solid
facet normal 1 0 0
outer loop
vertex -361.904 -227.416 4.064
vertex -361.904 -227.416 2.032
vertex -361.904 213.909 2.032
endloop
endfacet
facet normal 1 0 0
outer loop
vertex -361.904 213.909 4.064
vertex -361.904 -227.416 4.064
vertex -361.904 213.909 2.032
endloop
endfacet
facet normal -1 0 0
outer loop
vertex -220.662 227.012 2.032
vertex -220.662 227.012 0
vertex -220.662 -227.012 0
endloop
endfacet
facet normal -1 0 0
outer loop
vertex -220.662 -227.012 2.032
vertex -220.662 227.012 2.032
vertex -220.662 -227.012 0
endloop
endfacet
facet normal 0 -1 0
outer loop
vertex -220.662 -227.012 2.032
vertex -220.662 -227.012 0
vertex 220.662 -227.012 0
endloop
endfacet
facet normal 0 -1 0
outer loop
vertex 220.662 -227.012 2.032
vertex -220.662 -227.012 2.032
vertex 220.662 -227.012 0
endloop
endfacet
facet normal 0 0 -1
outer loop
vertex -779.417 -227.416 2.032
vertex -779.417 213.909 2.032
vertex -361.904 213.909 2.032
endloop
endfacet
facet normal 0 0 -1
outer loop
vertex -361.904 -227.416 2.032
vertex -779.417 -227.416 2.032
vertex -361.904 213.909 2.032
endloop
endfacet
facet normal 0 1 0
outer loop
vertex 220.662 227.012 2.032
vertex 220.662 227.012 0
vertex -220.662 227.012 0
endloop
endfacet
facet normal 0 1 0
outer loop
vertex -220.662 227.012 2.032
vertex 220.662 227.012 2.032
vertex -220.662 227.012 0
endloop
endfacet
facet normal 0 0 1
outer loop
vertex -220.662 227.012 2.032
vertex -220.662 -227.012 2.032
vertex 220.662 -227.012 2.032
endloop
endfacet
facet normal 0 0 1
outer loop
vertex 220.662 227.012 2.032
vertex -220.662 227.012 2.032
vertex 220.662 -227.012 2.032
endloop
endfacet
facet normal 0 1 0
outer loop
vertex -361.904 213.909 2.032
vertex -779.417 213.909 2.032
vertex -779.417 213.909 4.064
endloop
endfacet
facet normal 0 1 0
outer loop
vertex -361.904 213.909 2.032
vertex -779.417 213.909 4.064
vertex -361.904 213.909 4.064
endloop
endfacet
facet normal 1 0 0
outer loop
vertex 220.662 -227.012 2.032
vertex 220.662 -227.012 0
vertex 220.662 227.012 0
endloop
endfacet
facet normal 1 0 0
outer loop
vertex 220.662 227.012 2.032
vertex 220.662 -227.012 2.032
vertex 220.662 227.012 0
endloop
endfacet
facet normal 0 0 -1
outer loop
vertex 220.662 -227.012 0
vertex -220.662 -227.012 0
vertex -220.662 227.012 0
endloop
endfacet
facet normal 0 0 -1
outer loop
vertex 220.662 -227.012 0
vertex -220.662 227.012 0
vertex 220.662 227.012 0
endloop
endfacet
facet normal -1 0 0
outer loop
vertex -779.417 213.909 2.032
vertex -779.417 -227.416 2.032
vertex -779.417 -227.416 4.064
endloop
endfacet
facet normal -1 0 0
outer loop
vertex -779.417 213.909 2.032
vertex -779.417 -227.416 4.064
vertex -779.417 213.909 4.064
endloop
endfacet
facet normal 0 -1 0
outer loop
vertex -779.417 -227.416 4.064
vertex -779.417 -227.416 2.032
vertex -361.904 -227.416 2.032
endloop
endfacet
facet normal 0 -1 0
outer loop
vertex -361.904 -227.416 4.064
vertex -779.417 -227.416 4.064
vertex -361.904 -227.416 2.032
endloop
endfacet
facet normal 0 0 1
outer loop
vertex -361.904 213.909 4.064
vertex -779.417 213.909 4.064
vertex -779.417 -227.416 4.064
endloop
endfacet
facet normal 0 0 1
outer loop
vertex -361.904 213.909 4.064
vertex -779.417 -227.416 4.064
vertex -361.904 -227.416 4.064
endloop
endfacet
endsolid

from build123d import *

# Parameters (mm, degrees)
F1_DEPTH = 2.032
F2_W     = 417.5125
F2_H     = 441.325
F3_DEPTH = 2.032


# Not quite as in the source:
# - a feature names something its author has since deleted; it is built from what else it names


with BuildPart() as f1:
    # F0 (on Top) → F1 (new body)
    with BuildSketch(Plane.XY):
        Polygon((217.4875, -227.0125), (220.6625, -227.0125), (220.6625, -144.4625), (220.6625, 227.0125), (-220.6625, 227.0125), (-220.6625, -144.4625), (-220.6625, -227.0125), (-217.4875, -227.0125), align=None)
    extrude(amount=F1_DEPTH)


with BuildPart() as f3:
    # F2 (on face) → F3 (new body)
    with BuildSketch(Plane.XY.offset(2.032)):
        with Locations((-570.6602515221, -6.7539259434)):
            Rectangle(F2_W, F2_H)
    extrude(amount=F3_DEPTH)


solid = Compound([f1.part, f3.part])
